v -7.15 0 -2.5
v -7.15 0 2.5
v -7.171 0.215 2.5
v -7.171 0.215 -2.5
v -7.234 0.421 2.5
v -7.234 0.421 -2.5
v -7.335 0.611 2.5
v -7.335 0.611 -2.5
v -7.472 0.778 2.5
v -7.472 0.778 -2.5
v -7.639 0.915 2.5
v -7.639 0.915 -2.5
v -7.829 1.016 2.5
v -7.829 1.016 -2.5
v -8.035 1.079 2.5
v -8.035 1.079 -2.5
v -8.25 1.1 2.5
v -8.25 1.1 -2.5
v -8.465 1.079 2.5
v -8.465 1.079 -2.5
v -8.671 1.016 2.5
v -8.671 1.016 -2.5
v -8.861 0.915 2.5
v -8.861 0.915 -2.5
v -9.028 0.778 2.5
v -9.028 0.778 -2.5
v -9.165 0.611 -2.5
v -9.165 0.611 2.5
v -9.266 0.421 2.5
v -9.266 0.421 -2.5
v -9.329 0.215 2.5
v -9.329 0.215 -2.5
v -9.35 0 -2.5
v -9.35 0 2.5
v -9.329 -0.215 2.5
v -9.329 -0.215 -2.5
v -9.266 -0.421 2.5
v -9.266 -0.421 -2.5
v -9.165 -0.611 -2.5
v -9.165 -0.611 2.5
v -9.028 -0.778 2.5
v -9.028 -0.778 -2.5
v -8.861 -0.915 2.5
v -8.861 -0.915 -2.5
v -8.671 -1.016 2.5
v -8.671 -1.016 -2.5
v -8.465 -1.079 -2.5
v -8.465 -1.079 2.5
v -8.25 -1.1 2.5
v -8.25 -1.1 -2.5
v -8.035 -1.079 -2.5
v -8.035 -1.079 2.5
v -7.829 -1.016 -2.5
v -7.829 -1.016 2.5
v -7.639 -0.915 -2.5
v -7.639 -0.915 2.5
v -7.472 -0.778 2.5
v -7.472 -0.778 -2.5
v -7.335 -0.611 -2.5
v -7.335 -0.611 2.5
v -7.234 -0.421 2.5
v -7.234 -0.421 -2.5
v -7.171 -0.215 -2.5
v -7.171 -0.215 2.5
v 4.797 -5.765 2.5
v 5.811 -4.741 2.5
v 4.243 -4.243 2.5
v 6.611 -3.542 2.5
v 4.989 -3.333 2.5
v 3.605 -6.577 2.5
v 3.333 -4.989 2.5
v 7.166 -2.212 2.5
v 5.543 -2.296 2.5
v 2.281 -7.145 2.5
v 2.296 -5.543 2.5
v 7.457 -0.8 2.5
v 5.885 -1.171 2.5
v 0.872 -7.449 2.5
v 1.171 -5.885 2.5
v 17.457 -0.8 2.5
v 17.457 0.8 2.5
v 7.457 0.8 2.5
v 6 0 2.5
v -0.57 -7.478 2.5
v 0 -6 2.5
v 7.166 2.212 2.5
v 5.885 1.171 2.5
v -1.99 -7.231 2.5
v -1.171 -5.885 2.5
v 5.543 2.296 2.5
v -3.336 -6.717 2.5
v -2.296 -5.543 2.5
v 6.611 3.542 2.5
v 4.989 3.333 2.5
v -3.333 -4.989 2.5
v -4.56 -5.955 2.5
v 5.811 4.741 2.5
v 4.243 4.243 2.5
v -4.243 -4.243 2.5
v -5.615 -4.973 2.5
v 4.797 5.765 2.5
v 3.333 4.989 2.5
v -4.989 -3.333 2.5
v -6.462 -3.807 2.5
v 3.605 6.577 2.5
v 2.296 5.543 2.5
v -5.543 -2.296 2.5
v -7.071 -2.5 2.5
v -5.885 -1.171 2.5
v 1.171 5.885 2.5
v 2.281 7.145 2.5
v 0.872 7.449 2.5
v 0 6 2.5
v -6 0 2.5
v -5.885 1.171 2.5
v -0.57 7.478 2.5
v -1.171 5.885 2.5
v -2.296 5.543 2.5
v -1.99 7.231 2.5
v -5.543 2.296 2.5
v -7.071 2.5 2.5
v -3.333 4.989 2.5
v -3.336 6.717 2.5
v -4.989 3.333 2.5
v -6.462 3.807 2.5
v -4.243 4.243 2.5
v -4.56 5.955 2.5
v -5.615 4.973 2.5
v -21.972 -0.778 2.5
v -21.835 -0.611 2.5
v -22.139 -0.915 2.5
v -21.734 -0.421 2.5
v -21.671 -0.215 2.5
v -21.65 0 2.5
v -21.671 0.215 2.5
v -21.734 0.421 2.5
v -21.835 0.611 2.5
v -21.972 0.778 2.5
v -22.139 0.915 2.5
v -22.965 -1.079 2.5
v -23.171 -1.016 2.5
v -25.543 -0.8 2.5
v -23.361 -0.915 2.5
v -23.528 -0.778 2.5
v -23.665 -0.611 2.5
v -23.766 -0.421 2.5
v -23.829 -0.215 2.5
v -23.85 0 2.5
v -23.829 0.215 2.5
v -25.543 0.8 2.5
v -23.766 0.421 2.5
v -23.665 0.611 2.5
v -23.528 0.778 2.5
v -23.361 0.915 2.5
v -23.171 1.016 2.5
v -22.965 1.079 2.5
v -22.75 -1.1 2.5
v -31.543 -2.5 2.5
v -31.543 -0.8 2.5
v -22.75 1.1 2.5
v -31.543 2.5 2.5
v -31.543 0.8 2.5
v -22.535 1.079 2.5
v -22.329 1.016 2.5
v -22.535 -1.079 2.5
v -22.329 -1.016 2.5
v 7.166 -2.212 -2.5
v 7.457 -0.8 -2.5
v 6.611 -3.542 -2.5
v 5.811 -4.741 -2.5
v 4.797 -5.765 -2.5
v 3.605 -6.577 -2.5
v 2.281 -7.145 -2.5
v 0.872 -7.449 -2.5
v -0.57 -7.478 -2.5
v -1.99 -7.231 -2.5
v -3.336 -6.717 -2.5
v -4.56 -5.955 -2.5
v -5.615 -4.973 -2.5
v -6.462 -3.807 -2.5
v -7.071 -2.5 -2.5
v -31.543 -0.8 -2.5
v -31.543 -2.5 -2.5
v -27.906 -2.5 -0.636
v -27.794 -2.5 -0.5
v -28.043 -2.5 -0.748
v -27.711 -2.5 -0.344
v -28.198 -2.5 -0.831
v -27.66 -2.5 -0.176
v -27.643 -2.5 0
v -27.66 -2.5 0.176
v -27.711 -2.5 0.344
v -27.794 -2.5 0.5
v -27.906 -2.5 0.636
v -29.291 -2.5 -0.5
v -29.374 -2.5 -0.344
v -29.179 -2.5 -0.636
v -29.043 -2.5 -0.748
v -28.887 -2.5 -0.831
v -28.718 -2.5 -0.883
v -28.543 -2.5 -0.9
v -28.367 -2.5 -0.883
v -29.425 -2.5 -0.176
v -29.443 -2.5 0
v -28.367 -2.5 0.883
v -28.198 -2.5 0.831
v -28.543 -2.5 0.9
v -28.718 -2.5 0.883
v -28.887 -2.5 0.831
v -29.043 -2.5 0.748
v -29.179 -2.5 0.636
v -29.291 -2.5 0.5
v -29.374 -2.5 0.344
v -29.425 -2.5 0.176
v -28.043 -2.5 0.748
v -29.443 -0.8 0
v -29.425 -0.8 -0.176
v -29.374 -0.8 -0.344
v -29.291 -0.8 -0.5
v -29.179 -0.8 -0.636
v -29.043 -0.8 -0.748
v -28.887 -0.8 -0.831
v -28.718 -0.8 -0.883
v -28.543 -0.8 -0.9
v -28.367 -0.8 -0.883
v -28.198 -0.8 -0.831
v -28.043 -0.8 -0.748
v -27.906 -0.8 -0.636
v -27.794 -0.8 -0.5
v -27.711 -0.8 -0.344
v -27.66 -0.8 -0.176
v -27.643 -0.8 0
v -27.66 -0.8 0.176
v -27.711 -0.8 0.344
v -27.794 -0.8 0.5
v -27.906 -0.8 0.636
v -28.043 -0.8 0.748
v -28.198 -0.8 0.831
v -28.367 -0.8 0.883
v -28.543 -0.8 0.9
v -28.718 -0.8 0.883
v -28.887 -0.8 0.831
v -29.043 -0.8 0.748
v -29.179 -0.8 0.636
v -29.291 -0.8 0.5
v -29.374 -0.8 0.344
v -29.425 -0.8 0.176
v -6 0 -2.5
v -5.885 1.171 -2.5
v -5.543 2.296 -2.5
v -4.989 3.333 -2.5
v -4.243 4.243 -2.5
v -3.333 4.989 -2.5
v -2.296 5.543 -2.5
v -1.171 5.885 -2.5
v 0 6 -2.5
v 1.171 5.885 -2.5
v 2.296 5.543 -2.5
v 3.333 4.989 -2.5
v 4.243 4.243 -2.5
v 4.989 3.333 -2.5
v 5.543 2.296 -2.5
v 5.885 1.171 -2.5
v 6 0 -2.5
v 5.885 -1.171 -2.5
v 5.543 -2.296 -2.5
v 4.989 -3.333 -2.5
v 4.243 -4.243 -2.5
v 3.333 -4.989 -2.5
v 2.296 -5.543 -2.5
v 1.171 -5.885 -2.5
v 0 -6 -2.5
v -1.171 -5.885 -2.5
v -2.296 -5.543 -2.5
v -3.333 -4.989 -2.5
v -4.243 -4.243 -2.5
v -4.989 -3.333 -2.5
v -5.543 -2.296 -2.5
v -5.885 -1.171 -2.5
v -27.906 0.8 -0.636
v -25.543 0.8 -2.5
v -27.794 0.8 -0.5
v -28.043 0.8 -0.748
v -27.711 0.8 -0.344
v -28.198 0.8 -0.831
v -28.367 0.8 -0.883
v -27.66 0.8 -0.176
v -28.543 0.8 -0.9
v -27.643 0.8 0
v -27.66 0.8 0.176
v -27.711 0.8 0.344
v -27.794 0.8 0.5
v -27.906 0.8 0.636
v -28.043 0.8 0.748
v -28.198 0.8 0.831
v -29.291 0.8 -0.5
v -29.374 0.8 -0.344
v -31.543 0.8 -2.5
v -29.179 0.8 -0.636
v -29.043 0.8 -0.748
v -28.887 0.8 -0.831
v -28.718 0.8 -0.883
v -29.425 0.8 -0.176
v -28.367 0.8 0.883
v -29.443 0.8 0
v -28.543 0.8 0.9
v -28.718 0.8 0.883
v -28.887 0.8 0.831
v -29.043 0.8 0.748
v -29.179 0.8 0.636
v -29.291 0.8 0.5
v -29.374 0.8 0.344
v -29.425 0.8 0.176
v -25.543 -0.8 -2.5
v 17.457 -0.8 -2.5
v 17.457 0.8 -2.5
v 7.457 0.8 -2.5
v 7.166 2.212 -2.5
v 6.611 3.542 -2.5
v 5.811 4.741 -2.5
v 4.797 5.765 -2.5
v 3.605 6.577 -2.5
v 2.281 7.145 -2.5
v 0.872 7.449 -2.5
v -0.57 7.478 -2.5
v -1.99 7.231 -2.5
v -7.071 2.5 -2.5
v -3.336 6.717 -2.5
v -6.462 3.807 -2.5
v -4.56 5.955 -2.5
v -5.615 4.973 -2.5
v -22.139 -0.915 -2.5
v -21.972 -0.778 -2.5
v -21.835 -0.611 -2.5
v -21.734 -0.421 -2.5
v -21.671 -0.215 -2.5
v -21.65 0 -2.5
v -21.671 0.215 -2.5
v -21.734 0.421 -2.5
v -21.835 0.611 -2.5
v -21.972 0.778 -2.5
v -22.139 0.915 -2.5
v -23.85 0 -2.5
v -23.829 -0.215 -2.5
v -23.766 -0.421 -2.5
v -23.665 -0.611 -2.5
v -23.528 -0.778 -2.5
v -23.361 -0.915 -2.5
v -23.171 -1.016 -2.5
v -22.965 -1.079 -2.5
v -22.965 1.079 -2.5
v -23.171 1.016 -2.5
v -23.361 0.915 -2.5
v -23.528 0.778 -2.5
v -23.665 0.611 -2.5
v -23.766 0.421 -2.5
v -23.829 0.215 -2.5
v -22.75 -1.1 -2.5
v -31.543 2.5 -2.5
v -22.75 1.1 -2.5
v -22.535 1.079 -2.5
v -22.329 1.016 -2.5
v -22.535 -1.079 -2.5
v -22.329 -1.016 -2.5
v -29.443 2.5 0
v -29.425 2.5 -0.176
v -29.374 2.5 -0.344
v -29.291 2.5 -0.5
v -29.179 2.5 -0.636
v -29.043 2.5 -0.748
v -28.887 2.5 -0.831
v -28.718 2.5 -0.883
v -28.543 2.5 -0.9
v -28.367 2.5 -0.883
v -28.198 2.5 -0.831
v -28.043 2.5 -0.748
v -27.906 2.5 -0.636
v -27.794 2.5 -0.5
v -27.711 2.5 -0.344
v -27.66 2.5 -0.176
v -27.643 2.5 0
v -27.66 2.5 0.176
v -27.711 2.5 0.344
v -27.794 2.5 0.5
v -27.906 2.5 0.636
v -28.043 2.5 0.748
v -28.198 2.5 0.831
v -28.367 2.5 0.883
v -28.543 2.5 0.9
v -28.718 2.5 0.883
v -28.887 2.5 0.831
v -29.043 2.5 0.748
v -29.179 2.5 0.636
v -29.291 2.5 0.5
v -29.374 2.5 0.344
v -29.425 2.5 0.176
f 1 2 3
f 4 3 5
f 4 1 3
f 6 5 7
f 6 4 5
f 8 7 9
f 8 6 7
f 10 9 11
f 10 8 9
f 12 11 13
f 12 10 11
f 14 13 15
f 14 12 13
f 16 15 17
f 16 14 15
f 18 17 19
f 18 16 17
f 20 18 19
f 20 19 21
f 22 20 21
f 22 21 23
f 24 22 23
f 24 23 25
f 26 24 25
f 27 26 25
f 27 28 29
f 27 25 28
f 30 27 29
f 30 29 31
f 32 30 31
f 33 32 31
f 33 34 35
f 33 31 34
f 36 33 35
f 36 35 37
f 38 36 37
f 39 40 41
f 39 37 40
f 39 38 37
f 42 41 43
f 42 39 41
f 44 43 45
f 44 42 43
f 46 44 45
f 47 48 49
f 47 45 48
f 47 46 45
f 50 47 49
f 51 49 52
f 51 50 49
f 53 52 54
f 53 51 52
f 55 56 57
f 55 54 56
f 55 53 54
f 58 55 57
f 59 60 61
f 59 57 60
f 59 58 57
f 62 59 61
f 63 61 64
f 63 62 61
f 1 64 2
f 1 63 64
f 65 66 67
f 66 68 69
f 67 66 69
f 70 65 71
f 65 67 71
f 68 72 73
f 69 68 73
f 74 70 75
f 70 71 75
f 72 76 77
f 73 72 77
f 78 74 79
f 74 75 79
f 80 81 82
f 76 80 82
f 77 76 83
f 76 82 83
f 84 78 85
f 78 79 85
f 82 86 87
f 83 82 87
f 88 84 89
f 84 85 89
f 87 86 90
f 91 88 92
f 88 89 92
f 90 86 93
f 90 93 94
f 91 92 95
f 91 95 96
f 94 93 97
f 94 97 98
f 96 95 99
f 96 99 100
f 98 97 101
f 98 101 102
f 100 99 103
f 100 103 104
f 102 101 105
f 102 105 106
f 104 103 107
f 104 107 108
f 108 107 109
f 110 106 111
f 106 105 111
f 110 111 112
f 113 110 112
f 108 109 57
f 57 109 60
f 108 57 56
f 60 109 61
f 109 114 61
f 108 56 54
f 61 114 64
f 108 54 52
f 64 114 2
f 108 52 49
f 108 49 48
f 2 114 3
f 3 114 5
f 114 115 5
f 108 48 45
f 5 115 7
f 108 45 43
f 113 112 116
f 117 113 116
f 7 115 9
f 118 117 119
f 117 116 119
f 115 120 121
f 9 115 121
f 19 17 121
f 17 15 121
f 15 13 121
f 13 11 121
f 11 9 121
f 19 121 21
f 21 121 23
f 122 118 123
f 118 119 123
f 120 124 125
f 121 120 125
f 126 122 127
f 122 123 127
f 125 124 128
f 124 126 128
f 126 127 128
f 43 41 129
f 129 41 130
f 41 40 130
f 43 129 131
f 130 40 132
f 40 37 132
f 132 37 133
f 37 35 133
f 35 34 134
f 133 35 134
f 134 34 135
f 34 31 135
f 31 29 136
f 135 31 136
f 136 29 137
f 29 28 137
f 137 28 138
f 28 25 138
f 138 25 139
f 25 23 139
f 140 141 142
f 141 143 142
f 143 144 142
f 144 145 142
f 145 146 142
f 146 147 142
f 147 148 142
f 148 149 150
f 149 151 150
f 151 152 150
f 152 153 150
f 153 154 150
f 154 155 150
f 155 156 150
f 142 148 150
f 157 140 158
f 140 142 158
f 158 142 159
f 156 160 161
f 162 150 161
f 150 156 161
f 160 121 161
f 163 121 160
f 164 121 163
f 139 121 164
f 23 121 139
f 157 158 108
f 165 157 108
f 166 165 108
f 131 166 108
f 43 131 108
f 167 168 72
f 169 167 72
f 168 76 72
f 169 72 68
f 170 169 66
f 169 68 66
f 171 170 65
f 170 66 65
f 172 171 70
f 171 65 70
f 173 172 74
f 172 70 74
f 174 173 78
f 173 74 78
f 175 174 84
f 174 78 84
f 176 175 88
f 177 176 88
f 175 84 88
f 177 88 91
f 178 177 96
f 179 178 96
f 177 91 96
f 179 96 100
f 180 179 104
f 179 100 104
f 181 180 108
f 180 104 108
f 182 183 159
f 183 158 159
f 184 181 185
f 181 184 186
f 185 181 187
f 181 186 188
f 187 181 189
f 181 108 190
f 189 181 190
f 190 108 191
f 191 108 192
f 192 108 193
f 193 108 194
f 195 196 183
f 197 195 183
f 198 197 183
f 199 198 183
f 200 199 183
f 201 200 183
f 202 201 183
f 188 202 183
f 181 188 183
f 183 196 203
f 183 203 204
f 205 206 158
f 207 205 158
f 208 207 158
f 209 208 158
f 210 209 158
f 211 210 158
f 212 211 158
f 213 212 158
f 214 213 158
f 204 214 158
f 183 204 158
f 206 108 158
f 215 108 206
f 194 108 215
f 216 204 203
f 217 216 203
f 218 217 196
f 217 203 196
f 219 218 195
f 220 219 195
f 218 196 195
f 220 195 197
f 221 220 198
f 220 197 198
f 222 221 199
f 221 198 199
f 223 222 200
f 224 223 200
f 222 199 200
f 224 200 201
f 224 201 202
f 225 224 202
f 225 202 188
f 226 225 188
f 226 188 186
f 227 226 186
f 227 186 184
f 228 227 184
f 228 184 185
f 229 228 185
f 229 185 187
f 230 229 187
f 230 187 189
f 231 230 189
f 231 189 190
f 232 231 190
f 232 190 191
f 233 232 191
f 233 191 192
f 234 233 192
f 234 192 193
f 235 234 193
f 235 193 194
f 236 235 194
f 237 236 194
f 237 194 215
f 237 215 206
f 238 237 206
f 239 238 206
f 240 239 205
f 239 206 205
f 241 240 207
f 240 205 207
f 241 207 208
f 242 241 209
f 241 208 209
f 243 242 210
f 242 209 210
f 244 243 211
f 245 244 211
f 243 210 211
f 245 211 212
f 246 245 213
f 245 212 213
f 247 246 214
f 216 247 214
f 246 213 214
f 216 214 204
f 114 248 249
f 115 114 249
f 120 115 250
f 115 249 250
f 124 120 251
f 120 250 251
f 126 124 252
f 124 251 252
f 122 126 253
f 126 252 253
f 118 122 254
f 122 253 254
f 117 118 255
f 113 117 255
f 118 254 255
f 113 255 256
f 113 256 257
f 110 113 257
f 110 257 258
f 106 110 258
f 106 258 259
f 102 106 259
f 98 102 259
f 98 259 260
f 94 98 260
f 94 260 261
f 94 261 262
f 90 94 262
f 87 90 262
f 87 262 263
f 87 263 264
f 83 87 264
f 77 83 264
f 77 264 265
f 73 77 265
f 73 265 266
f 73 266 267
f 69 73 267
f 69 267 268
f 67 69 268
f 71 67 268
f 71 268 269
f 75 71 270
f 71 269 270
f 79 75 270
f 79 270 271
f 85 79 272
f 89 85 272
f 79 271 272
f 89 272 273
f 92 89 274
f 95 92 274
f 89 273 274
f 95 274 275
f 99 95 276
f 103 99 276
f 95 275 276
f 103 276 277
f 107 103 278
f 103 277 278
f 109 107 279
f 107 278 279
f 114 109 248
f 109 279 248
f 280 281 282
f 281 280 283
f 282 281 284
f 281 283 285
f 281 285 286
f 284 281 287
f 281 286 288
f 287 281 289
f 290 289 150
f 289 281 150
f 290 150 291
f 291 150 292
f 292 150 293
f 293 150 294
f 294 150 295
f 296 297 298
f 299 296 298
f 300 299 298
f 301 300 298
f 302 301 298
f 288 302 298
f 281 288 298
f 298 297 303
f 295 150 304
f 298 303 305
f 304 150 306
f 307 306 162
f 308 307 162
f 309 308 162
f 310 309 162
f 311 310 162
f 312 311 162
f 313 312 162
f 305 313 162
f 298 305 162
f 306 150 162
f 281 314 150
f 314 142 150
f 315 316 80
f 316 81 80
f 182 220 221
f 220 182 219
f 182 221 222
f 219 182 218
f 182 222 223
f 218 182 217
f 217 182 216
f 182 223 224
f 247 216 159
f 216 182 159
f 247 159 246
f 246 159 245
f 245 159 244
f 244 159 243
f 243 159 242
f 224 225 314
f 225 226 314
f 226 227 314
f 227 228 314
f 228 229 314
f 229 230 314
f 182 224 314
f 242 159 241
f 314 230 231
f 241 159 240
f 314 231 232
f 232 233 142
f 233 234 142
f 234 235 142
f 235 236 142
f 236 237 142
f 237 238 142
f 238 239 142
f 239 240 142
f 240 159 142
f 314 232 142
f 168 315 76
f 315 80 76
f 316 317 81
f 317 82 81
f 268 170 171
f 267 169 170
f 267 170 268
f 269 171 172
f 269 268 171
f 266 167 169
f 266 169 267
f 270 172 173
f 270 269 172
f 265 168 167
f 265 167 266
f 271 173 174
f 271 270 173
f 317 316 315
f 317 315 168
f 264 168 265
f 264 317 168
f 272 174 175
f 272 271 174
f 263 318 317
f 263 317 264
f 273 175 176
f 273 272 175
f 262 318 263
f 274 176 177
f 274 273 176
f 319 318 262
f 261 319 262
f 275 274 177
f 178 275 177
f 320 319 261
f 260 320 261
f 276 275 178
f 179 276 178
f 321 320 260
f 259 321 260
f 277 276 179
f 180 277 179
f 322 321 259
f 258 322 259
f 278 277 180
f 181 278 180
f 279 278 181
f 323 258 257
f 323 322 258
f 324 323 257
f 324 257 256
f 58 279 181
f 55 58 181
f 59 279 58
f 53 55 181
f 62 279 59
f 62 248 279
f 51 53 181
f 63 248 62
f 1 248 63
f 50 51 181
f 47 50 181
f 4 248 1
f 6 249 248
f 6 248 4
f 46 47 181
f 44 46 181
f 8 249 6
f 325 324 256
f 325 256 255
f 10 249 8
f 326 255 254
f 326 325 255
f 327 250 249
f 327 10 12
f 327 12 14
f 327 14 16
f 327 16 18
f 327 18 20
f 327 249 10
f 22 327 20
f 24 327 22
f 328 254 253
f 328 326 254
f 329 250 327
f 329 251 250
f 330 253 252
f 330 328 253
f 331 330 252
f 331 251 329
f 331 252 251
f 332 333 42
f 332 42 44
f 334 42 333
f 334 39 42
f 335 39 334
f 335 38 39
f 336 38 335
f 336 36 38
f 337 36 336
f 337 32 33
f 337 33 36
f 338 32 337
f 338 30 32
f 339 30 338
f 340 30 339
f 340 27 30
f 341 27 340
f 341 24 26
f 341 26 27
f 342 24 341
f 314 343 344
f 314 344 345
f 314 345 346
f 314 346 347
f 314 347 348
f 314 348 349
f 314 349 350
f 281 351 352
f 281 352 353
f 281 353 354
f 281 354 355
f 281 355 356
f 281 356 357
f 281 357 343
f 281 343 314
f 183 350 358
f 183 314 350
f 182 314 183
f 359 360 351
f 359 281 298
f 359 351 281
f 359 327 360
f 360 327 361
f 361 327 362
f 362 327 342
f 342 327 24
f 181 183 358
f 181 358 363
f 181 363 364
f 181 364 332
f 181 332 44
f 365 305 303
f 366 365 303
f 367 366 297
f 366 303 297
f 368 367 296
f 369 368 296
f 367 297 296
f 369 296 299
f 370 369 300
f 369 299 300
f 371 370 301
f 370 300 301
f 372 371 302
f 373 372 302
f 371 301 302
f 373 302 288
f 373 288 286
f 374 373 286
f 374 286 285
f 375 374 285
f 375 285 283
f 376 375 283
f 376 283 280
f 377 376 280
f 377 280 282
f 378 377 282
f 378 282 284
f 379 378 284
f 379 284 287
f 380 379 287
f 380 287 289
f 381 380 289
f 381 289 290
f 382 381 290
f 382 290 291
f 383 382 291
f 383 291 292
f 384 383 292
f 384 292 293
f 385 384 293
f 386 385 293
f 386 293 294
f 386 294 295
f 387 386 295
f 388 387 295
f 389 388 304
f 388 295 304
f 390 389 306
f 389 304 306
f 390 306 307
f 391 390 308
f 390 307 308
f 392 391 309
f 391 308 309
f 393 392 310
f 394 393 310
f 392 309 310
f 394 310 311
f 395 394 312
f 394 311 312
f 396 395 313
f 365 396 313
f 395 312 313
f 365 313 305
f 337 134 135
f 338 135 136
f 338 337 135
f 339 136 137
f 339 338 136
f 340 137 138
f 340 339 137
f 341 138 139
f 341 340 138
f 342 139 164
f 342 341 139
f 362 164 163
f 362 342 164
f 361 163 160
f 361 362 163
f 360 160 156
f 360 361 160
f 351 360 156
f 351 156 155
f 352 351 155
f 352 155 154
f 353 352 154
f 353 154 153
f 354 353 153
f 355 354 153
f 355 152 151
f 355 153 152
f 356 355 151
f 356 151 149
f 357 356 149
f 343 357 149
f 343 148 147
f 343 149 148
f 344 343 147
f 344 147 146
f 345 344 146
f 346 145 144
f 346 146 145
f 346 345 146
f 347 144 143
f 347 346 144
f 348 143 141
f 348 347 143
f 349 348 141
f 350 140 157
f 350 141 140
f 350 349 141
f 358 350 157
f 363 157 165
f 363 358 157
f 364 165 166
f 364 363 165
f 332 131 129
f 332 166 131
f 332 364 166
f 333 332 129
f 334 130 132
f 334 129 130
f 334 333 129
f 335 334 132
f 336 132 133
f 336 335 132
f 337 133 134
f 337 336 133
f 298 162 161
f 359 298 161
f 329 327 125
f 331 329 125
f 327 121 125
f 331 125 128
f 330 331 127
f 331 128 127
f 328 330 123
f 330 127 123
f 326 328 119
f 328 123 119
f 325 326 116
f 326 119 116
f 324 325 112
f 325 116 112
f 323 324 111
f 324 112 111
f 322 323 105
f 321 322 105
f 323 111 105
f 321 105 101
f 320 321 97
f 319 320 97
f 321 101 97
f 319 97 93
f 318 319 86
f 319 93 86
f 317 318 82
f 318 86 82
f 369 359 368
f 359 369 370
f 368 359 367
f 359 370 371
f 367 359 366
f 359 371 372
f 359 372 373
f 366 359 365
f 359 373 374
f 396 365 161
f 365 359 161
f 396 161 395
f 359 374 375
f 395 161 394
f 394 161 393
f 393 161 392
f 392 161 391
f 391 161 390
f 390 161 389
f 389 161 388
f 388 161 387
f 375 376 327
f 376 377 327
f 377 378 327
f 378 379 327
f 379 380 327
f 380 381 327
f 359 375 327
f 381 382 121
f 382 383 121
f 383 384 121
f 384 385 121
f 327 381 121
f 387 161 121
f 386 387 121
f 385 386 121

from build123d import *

# Parameters (mm, degrees)
BOSS_EXTRUDE1_DEPTH          = 2.5
TAP_DRILL_FOR_M12X1_5_TAP1_D = 12
HOLE1_D                      = 1.8
SKETCH7_R                    = 1.1
CUT_EXTRUDE1_DEPTH           = 33.805449556


with BuildPart() as part:
    # Sketch1 → Boss-Extrude1 (new, symmetric)
    with BuildSketch(Plane.XY):
        with BuildLine():
            Line((-31.542788725, 2.5), (-7.071067812, 2.5))
            ThreePointArc((-7.071067812, 2.5), (0.871651704, 7.449176015), (7.457211275, 0.8))
            Line((7.457211275, 0.8), (17.457211275, 0.8))
            Line((17.457211275, 0.8), (17.457211275, -0.8))
            Line((17.457211275, -0.8), (7.457211275, -0.8))
            ThreePointArc((7.457211275, -0.8), (0.871651704, -7.449176015), (-7.071067812, -2.5))
            Line((-7.071067812, -2.5), (-31.542788725, -2.5))
            Line((-31.542788725, -2.5), (-31.542788725, -0.8))
            Line((-31.542788725, -0.8), (-25.542788725, -0.8))
            Line((-25.542788725, -0.8), (-25.542788725, 0.8))
            Line((-25.542788725, 0.8), (-31.542788725, 0.8))
            Line((-31.542788725, 0.8), (-31.542788725, 2.5))
        make_face()
    extrude(amount=BOSS_EXTRUDE1_DEPTH, both=True)

    # Tap Drill for M12x1.5 Tap1 (through all)
    with Locations(Plane.XY.offset(2.5)):
        with Locations((0, 0)):
            Hole(TAP_DRILL_FOR_M12X1_5_TAP1_D / 2)

    # Hole1 (through all)
    with Locations(Plane(origin=(0, 2.5, 0), x_dir=(1, 0, 0), z_dir=(0, 1, 0))):
        with Locations((-28.542788725, 0)):
            Hole(HOLE1_D / 2)

    # Sketch7 → Cut-Extrude1 (cut, through all)
    with BuildSketch(Plane.XY.offset(-2.5)):
        with Locations((-8.25, 0)):
            Circle(SKETCH7_R)
        with Locations((-22.75, 0)):
            Circle(SKETCH7_R)
    extrude(amount=CUT_EXTRUDE1_DEPTH, mode=Mode.SUBTRACT)


solid = part.part
